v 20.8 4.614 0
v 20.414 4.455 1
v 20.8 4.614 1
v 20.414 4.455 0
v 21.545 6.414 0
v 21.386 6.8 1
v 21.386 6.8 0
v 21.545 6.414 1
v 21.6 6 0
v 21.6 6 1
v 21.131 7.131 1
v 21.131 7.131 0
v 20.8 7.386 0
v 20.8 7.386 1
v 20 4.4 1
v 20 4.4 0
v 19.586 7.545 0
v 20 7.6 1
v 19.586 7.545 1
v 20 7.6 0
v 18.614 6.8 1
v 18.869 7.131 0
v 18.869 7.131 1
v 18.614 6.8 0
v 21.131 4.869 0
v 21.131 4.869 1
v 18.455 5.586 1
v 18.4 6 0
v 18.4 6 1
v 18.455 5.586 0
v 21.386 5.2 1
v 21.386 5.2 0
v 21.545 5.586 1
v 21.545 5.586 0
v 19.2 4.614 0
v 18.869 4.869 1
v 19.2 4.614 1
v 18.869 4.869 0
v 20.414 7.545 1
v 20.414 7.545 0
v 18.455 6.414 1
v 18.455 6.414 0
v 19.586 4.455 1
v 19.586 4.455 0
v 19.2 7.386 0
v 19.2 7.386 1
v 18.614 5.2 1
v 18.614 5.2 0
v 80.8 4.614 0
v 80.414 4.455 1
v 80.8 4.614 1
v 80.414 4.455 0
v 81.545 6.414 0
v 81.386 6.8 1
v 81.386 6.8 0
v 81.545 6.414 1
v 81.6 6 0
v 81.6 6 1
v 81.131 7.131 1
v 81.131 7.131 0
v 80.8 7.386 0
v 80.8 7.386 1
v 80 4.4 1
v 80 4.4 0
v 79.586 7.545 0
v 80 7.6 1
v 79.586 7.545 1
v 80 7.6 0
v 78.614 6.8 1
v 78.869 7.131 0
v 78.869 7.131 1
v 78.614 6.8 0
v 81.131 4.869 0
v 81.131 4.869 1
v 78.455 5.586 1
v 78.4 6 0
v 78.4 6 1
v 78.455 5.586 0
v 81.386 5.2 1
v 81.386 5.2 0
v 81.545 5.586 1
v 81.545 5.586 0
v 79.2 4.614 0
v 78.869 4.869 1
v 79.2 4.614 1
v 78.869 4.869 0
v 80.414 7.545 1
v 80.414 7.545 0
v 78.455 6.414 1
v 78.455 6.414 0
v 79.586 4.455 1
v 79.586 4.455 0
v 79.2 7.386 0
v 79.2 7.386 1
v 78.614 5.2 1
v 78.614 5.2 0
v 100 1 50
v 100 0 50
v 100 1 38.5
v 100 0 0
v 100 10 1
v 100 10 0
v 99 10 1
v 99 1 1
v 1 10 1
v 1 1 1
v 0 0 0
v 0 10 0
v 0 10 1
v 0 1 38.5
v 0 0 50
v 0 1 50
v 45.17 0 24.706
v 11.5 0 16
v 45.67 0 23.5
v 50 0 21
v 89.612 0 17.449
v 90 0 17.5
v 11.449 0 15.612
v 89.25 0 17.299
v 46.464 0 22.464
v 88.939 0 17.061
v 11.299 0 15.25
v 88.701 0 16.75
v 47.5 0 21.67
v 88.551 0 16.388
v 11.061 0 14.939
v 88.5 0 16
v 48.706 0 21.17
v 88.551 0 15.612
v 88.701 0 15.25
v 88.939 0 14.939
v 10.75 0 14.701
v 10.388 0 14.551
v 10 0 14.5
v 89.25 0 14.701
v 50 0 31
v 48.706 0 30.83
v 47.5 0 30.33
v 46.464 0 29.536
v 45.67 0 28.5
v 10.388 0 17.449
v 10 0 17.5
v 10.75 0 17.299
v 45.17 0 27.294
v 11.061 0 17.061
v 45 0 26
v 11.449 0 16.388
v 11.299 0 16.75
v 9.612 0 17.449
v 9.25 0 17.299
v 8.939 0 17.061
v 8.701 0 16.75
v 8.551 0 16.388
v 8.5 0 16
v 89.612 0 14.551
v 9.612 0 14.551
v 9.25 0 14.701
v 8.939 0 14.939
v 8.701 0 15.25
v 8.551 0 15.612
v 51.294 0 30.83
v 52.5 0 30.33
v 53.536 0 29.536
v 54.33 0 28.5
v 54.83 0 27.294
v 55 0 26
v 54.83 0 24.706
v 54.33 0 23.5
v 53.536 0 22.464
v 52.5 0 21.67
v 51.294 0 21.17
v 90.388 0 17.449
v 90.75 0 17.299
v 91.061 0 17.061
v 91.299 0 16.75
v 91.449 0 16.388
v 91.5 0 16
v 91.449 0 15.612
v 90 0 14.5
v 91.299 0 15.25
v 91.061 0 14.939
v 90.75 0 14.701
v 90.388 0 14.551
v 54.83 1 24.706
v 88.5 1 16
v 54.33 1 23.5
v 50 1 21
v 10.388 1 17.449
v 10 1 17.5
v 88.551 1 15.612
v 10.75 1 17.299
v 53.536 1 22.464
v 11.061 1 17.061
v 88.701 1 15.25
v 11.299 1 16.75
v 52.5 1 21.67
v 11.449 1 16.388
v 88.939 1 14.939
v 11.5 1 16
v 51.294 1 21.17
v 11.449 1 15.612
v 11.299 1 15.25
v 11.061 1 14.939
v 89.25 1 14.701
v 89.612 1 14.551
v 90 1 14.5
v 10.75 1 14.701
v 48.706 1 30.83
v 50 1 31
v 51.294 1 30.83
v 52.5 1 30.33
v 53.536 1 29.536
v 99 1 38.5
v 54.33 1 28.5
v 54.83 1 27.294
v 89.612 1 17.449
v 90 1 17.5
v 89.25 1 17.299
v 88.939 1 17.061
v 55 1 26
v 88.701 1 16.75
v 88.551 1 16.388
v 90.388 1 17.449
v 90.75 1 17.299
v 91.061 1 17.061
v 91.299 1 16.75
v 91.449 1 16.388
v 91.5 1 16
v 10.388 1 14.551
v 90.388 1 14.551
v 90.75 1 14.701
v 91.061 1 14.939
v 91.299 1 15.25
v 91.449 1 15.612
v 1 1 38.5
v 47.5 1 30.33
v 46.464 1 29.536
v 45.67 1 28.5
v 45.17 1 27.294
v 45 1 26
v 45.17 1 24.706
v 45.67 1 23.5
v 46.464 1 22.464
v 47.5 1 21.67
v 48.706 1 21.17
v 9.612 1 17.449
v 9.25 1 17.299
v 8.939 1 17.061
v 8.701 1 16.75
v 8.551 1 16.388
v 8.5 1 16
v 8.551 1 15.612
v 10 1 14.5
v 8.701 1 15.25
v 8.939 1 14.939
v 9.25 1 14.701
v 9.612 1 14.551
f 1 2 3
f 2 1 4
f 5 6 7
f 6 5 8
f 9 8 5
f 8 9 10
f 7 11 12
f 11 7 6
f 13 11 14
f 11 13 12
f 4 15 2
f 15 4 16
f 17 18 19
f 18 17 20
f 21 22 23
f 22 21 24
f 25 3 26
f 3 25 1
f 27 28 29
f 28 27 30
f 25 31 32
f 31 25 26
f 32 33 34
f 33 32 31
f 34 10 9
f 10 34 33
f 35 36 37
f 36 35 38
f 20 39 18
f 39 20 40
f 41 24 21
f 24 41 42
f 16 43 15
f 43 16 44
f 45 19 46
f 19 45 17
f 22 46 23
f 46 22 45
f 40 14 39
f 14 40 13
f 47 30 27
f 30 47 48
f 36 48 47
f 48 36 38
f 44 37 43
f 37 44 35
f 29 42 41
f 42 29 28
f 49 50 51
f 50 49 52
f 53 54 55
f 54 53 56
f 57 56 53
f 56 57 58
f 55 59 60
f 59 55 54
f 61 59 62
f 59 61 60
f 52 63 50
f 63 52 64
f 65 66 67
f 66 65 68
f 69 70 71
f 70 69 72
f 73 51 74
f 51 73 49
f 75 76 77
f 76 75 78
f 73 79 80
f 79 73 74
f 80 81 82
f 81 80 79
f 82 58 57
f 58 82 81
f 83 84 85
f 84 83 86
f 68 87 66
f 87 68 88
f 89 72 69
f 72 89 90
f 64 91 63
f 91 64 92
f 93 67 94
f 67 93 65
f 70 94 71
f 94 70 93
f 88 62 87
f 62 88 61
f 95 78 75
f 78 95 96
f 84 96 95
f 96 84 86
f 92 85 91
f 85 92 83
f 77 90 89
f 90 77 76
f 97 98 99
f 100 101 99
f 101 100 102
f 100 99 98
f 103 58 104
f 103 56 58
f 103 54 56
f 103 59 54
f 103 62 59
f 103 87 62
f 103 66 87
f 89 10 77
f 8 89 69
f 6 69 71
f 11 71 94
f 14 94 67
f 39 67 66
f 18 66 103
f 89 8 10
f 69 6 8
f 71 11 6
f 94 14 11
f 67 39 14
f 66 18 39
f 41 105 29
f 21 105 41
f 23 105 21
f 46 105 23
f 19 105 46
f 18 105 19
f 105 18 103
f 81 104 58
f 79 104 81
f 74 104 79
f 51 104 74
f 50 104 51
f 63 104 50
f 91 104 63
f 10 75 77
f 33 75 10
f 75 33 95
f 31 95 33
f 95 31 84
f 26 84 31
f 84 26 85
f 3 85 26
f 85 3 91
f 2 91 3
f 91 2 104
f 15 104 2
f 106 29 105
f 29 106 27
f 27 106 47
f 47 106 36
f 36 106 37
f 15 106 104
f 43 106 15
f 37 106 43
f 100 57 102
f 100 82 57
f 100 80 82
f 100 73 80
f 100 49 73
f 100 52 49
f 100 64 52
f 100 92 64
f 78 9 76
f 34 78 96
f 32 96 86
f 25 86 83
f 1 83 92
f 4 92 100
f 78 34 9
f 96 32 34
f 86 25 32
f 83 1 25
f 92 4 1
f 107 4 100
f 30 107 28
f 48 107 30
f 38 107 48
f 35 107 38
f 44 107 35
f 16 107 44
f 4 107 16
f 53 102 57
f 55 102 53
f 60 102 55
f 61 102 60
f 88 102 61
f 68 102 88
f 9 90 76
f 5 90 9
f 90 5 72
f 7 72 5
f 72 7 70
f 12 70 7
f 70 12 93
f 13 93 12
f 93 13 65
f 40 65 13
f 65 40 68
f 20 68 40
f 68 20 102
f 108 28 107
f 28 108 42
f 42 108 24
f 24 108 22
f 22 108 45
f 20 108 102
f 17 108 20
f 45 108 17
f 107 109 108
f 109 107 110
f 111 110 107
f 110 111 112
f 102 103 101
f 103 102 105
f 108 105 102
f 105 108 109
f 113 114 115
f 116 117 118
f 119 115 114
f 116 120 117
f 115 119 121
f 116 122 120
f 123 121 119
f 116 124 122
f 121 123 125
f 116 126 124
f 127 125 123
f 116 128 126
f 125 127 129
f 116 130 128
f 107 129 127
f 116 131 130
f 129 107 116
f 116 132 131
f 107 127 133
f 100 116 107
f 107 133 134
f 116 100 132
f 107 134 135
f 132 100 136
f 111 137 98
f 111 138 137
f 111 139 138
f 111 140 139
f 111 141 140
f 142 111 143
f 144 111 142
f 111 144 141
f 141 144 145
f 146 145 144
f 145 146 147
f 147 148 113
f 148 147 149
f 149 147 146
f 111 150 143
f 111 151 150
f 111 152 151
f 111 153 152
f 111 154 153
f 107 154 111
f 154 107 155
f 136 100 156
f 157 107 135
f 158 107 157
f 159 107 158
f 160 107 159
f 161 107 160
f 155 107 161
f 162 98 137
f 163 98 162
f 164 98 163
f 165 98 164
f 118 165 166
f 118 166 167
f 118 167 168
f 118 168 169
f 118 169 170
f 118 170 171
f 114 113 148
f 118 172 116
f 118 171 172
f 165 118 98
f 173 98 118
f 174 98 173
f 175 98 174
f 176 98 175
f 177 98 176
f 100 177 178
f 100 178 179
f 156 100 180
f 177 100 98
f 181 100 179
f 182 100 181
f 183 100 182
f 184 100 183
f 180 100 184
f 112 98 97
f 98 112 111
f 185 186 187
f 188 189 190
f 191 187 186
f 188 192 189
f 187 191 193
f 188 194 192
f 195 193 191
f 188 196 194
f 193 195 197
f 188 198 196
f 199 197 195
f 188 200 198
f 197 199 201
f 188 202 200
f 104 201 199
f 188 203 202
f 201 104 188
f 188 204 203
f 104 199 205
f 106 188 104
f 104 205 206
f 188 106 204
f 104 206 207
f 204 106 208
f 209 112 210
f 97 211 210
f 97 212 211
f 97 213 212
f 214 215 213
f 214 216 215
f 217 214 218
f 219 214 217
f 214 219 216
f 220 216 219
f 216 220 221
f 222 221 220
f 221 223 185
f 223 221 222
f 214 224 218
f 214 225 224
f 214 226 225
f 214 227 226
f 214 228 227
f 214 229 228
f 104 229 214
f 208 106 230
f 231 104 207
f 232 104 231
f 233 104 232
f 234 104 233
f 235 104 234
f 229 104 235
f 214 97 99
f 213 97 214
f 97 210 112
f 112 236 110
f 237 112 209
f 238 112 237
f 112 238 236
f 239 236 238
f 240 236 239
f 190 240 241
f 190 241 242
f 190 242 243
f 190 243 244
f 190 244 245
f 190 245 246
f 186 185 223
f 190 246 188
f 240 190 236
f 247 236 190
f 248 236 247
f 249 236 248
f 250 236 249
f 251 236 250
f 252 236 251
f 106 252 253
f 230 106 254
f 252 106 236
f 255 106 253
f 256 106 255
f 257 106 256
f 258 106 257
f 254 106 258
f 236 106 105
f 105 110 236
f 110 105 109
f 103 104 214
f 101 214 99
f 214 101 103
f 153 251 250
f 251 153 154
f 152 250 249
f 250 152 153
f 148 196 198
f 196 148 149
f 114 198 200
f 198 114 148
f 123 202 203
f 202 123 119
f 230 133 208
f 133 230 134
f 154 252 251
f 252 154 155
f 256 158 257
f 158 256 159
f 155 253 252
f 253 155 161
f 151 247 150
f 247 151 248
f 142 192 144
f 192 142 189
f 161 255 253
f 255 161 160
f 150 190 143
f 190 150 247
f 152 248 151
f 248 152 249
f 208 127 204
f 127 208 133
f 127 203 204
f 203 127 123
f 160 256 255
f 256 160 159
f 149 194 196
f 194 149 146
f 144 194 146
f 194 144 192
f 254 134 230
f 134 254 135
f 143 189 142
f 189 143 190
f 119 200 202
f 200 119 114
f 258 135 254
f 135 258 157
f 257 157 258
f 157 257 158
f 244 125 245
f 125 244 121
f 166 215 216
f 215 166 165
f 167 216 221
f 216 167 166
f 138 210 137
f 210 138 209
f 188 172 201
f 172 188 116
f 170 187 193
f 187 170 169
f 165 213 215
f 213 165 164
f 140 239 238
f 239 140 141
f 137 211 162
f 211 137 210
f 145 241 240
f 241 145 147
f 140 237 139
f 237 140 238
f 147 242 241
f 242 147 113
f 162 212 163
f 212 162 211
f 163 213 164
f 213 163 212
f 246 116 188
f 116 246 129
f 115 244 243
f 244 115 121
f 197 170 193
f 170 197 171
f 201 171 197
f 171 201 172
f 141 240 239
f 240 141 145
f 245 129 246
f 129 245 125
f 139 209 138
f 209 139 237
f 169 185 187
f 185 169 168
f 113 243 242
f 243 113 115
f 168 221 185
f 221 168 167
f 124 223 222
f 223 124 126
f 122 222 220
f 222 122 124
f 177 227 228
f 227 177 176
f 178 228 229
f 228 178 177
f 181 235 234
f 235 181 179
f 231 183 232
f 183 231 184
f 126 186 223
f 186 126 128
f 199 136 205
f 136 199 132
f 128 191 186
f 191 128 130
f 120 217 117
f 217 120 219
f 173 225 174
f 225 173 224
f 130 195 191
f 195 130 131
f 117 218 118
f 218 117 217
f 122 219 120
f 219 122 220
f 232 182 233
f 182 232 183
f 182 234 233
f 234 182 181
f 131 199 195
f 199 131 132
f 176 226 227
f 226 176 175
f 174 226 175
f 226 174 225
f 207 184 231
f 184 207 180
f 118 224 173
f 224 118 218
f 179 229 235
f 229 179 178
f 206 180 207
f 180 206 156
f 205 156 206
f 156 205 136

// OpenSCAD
/****************************************************************************************************************************
*
* Description.
* ============
* A Generic and parametered 'Mounting Bracket with Supports' object
* to be used either separately or as part of a greater model.
*
* How to better describe the object provided by this module?
* The best I can come up with is this:
*
* Open the module in an empty OpenSCAD session.
* It will make a demo object with some decent default values.
* Turn it around and study it.
* Decide if it's of any use in your project(s).
*
*
* How to use it.
* ==============
* If you <include> this module into your OpenSCAD file, the default demo object will be produced.
* This is probably not what you want long term.
* But it's a good way to visualize what the module can provide.
* If you <use> this module from your OpenSCAD file, then the module will *not* be instantiated,
* but you must instantiate it from your own code.
*
* That's when you'll have to start studying the parameters and their influence on the Mounting Bracket object.
* Tip: Take advantage of named parameters. It'll make your own calling code easier to read.
*
*
* XYZ-orientation.
* ================
* The object will allways be placed in the first quadrant, with what could be called
* "the lower left corner" on the origin at Z=0 and stretching "to the right" into X.
*
* The face-plate wall, where we imagine to attach 'things' to the bracket, will be turned 'forward'
* in a default camera position.
*
*
* Parameters.
* ===========
* l => Length. That's a lower case 'L'. Size from origin along the X axis.
*      Must be greater than zero.
*      Must be at least 2 times the wall_thickness (see below).
*
* w => Width. Size from the origin along the Y axis, as measured on Z=0.
*      Must be greater than zero.
*
* h => Height. Size above Z=0.
*      Must be a positive number.
*      If 'h' is exactly zero, then a gentle reminder warning is issued and no bracket is created.
*      See that as a possibility to temporary suppress the creation of the Bracket object.
*
* wall_thickness => The thickness of the face-plate and the two triangular supports.
*                   Must be greater than zero.
*
* wall_holes_xzd_matrix => Matrix, a vector of vectors.
*                          For each hole to punch through the face wall, a vector of 3 elements [x,z,d].
*                          'x' position, 'z' position, hole 'd'iameter.
*                          Three different holes at given positions could be provided as:
*                          wall_holes_xzd_matrix=[ [10,15,3], [50,25,10], [90,15,3] ]
*                          Default is 'no holes', i.e. an empty vector. Like this: wall_holes_xzd_matrix=[]
*
* footer_thickness => The thickness of the footer. If set to zero, then no footer is produced.
*                     May not be negative.
*                     A footer makes sense for instance if the Mounting Bracket is going to be 3D-printed as a separate
*                     part and then bolted to some 'main object' of yours.
*                     If the Mounting Bracket will be 3D-printed together with some 'main object', in one combined print,
*                     then the footer can be omitted by setting its thickness to zero.
*
* footer_holes_xyd_matrix => Matrix, a vector of vectors.
*                            For each mounting hole to punch through the footer, a vector of 3 elements [x,y,d].
*                            'x' position, 'y' position, hole 'd'iameter.
*                            Three holes for M3 screws at given positions could be provided as:
*                            footer_holes_xyd_matrix=[ [20,6,3.2], [45,6,3.2], [80,6,3.2] ]
*                            Default is 'no footer holes', i.e. an empty vector. Like this: footer_holes_xyd_matrix=[]
*
* verbosity => A positive integer value to request 'debug' information to be displayed during the instantiation of the object.
*              Default is '0' (zero), which is equal to 'quiet'.
*
****************************************************************************************************************************/

/*
 Demo driver, activated by <include>.
 Use <use> to not show the demo.
*/
Mounting_Bracket_With_Supports(l=100,
			       w=10,
			       h=50,
			       wall_thickness=1,
			       wall_holes_xzd_matrix=[ [10,15,3], [50,25,10], [90,15,3] ],
			       footer_thickness=1,
			       footer_holes_xyd_matrix=[ [20,6,3.2],[80,6,3.2] ],
			       verbosity=1,
			       $fn=24);


/*
 The external calling interface. Reasonable default values are set.
 By default, there are no mounting holes in the footer.
 To see footer holes, activate the demo above, using <include>.
*/
module Mounting_Bracket_With_Supports(l=100,
				      w=10,
				      h=50,
				      wall_thickness=1,
				      wall_holes_xzd_matrix=[],
				      footer_thickness=1,
				      footer_holes_xyd_matrix=[],
				      verbosity=0) {
     //  Simple verification of some input variables.
     assert(l > 0,"You must provide a positive 'X' length greater than zero!");
     assert(w > 0,"You must provide a positive 'Y' width greater than zero!");
     assert(h >= 0,"Height (h) may not be negative. Set to zero to suppress instantiation of the Mounting Bracket.");
     assert(wall_thickness > 0,"Wall Thickness must be > 0.");
     assert(footer_thickness >= 0,"Footer Thickness may not be negative. Set to zero to suppress the Footer.");
     assert(h >= footer_thickness,"Footer Thickness may not be > total height (h).");
     assert(l >+ (wall_thickness*2),"The length (l) must be at least 2 times the wall thickness.");

     pass_through=0.001; // To avoid having a hole flush with a surface.
     height_ratio=0.75;  // Could become a parameter.
     
     // Private module, 'protected' by scope.
     module Support_Wall_Triangle(h=30,w=10,t=wall_thickness) {
	  linear_extrude(height=t)
	       polygon(points=[ [0,0], [w,0], [0,h]]);
     }

     if((h-footer_thickness) <= 0) {
	  echo(str("WARNING: Mounting Bracket has no height over its footer. No Mounting Bracket will be produced."));
     }
     else {
	  // Union between the footer and the face-plate (with supports).
	  union() {
	       // The footer.
	       if (footer_thickness > 0) {
		    // If footer is requested, i.e. thicker than 0.
		    difference() {
			 // Create the footer itself.
			 cube([l,w,footer_thickness]);
			 // If screwholes are requested for the footer, punch the holes.
			 for(hole=footer_holes_xyd_matrix) {
			      // Verify that no footer hole becomes 'invisible' by being put beyond the footer area.
			      assert(hole[0] >= 0,
				     str("Footer hole 'x' (",
					 hole[0],
					 ") may not be negative."));
			      assert(hole[0] < l,
				     str("Footer hole 'x' (",
					 hole[0],
					 ") may not be set beyond bracket length 'l' (",
					 l,")."));
			      if(verbosity > 0) {
				   // Only upon explicit request.
				   echo(str("Footer hole vector: [",hole[0],",",hole[1],",",hole[2],"]."));
			      }
			      translate([hole[0],hole[1],-pass_through])
				   cylinder(h=footer_thickness+(2*pass_through),
					    d=hole[2],
					    center=false);
			 }
		    }
	       }
	       // The face-plate.
	       translate([0,0,footer_thickness])
		    // Lift the wall and the supports to give z-place for the footer.
		    // If footer_thickness == 0, then the lift becomes null.
		    difference() {
		    // Build the face-plate...
		    union() {
		    // The main 'standing' wall, i.e. the face-plate.
		    cube([l,
			  wall_thickness,
			  h-footer_thickness]); // If there was a footer, we'll have to reduce the face-plate height accordingly.
		    // Left triangular support.
		    translate([0,wall_thickness,0]) // So the support doesn't 'enter', becomes part of,  the main wall.
			 rotate([0,0,90]) // Twist around Z.
			 rotate([90,0,0]) // Stand up.
			 Support_Wall_Triangle(h=h*height_ratio,w=w-wall_thickness);
		    // Right triangular support.
		    translate([l-wall_thickness,  // Off to the right.
			       wall_thickness,  // So it doesn't 'enter' the main wall.
			       0])
			 rotate([0,0,90]) // Twist around Z.
			 rotate([90,0,0]) // Stand up.
			 Support_Wall_Triangle(h=h*height_ratio,w=w-wall_thickness);
		    }
		    // Remove 'wall' holes from the face-plate.
		    // If screwholes are requested for the wall, punch the holes.
		    for(wall_hole=wall_holes_xzd_matrix) {
			 if(verbosity > 0) {
			      // Only upon explicit request.
			      echo(str("Wall hole vector: [",wall_hole[0],",",wall_hole[1],",",wall_hole[2],"]."));
			 }
			 translate([wall_hole[0],wall_thickness+pass_through,wall_hole[1]])
			      rotate([90,0,0])
			      cylinder(h=wall_thickness+(2*pass_through),
				       d=wall_hole[2],
				       center=false);
		    }
	       }
	  }
     }
}

// EOF.
